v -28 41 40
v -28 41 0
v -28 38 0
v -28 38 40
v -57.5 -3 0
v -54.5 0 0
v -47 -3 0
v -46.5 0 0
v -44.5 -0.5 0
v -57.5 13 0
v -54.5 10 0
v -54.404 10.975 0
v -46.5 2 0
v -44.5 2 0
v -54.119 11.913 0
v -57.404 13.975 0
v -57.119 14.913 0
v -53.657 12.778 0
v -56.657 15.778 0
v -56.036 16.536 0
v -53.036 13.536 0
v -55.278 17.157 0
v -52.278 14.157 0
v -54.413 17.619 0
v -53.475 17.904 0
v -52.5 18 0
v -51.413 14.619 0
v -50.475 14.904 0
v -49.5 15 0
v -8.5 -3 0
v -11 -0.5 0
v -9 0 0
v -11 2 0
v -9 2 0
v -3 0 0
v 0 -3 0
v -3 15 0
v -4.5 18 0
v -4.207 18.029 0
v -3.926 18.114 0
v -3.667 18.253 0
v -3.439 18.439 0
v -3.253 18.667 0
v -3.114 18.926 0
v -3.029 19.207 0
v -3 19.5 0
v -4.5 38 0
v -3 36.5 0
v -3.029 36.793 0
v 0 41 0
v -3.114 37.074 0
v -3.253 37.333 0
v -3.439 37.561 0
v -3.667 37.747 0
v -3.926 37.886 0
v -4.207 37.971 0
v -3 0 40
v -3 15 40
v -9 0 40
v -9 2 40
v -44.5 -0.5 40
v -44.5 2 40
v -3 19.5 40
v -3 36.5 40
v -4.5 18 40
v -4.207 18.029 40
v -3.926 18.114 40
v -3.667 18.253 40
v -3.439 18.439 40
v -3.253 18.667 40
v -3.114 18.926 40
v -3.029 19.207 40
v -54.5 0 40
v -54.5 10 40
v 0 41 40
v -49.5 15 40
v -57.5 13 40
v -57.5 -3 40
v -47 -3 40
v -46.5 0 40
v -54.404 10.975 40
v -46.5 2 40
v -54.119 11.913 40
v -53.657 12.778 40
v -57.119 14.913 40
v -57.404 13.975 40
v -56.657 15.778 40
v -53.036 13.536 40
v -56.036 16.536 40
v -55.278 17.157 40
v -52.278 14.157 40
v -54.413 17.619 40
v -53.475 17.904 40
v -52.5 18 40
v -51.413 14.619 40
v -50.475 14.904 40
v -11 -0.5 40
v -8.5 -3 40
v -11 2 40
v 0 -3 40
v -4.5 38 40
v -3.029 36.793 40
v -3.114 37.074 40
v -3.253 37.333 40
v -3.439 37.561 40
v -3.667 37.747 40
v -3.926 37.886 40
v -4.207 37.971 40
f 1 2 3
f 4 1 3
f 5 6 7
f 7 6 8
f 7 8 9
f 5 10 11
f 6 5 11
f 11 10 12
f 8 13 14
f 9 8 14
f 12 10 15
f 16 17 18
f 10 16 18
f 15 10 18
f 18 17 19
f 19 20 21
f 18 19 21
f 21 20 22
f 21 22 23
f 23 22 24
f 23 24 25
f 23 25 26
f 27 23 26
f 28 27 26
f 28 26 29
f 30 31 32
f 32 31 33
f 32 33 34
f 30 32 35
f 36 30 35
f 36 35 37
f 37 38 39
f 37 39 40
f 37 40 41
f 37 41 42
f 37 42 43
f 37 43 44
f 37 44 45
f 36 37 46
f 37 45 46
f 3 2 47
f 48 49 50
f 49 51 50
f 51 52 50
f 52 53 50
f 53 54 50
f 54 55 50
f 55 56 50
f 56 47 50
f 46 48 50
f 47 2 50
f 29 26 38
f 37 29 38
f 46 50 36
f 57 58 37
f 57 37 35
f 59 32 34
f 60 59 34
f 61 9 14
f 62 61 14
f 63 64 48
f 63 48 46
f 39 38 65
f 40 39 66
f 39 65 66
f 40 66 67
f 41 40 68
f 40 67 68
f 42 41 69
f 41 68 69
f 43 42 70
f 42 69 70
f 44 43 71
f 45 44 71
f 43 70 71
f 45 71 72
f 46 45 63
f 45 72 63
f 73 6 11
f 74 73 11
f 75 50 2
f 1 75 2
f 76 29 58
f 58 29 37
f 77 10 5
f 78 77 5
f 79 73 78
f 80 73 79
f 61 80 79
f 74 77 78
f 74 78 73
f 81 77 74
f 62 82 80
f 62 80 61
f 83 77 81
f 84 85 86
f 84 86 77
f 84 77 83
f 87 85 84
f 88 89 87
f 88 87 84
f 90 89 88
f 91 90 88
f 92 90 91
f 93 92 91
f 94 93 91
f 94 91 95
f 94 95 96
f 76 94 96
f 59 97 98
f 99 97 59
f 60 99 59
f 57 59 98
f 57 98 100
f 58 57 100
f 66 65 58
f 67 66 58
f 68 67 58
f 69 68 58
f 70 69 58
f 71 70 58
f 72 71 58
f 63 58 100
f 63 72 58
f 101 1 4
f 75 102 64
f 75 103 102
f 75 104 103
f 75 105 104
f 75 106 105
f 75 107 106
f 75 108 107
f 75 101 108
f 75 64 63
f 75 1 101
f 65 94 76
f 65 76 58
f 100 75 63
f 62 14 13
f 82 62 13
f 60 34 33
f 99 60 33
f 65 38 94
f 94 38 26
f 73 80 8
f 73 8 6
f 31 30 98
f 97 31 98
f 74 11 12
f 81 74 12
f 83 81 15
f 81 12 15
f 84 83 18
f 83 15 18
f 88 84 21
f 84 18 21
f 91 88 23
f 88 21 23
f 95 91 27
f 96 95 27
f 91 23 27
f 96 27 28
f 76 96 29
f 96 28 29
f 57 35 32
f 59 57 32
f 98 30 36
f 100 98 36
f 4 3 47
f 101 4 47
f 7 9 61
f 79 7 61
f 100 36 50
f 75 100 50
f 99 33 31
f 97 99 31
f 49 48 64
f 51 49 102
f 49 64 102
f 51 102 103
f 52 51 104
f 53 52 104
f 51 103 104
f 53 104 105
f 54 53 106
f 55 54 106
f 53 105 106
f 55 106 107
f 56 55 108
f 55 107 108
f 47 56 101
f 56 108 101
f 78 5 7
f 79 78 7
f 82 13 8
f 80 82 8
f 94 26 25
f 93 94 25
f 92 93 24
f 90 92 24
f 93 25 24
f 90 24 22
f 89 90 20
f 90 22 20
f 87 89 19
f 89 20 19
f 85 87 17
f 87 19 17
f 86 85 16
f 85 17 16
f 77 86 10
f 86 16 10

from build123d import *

# Parameters (mm, degrees)
F1_DEPTH = 40
F2_SIZE  = 2.5
F3_R     = 1.5


with BuildPart() as f1:
    # F0 (on Top) → F1 (new body)
    with BuildSketch(Plane.XY):
        with BuildLine():
            Line((0, -3), (0, 0))
            Line((0, 0), (0, 18))
            Line((0, 18), (0, 41))
            Line((0, 41), (-28, 41))
            Line((-28, 41), (-28, 38))
            Line((-28, 38), (-3, 38))
            Line((-3, 38), (-3, 18))
            Line((-3, 18), (-52.5, 18))
            ThreePointArc((-52.5, 18), (-56.035534, 16.535534), (-57.5, 13))
            Line((-57.5, 13), (-57.5, -3))
            Line((-57.5, -3), (-53, -3))
            Line((-53, -3), (-44.5, -3))
            Line((-44.5, -3), (-44.5, 0))
            Line((-44.5, 0), (-44.5, 2))
            Line((-44.5, 2), (-46.5, 2))
            Line((-46.5, 2), (-46.5, 0))
            Line((-46.5, 0), (-54.5, 0))
            Line((-54.5, 0), (-54.5, 10))
            ThreePointArc((-54.5, 10), (-53.035534, 13.535534), (-49.5, 15))
            Line((-49.5, 15), (-3, 15))
            Line((-3, 15), (-3, 0))
            Line((-3, 0), (-9, 0))
            Line((-9, 0), (-9, 2))
            Line((-9, 2), (-11, 2))
            Line((-11, 2), (-11, 0))
            Line((-11, 0), (-11, -3))
            Line((-11, -3), (0, -3))
        make_face()
    extrude(amount=F1_DEPTH)

    # F2
    f2_edges = [f1.edges().sort_by_distance(p)[0] for p in [
        (-11, -3, 20),
        (-44.5, -3, 20),
    ]]
    chamfer(f2_edges, length=F2_SIZE)

    # F3
    f3_edges = [f1.edges().sort_by_distance(p)[0] for p in [
        (-3, 18, 20),
        (-3, 38, 20),
    ]]
    fillet(f3_edges, radius=F3_R)


solid = f1.part
